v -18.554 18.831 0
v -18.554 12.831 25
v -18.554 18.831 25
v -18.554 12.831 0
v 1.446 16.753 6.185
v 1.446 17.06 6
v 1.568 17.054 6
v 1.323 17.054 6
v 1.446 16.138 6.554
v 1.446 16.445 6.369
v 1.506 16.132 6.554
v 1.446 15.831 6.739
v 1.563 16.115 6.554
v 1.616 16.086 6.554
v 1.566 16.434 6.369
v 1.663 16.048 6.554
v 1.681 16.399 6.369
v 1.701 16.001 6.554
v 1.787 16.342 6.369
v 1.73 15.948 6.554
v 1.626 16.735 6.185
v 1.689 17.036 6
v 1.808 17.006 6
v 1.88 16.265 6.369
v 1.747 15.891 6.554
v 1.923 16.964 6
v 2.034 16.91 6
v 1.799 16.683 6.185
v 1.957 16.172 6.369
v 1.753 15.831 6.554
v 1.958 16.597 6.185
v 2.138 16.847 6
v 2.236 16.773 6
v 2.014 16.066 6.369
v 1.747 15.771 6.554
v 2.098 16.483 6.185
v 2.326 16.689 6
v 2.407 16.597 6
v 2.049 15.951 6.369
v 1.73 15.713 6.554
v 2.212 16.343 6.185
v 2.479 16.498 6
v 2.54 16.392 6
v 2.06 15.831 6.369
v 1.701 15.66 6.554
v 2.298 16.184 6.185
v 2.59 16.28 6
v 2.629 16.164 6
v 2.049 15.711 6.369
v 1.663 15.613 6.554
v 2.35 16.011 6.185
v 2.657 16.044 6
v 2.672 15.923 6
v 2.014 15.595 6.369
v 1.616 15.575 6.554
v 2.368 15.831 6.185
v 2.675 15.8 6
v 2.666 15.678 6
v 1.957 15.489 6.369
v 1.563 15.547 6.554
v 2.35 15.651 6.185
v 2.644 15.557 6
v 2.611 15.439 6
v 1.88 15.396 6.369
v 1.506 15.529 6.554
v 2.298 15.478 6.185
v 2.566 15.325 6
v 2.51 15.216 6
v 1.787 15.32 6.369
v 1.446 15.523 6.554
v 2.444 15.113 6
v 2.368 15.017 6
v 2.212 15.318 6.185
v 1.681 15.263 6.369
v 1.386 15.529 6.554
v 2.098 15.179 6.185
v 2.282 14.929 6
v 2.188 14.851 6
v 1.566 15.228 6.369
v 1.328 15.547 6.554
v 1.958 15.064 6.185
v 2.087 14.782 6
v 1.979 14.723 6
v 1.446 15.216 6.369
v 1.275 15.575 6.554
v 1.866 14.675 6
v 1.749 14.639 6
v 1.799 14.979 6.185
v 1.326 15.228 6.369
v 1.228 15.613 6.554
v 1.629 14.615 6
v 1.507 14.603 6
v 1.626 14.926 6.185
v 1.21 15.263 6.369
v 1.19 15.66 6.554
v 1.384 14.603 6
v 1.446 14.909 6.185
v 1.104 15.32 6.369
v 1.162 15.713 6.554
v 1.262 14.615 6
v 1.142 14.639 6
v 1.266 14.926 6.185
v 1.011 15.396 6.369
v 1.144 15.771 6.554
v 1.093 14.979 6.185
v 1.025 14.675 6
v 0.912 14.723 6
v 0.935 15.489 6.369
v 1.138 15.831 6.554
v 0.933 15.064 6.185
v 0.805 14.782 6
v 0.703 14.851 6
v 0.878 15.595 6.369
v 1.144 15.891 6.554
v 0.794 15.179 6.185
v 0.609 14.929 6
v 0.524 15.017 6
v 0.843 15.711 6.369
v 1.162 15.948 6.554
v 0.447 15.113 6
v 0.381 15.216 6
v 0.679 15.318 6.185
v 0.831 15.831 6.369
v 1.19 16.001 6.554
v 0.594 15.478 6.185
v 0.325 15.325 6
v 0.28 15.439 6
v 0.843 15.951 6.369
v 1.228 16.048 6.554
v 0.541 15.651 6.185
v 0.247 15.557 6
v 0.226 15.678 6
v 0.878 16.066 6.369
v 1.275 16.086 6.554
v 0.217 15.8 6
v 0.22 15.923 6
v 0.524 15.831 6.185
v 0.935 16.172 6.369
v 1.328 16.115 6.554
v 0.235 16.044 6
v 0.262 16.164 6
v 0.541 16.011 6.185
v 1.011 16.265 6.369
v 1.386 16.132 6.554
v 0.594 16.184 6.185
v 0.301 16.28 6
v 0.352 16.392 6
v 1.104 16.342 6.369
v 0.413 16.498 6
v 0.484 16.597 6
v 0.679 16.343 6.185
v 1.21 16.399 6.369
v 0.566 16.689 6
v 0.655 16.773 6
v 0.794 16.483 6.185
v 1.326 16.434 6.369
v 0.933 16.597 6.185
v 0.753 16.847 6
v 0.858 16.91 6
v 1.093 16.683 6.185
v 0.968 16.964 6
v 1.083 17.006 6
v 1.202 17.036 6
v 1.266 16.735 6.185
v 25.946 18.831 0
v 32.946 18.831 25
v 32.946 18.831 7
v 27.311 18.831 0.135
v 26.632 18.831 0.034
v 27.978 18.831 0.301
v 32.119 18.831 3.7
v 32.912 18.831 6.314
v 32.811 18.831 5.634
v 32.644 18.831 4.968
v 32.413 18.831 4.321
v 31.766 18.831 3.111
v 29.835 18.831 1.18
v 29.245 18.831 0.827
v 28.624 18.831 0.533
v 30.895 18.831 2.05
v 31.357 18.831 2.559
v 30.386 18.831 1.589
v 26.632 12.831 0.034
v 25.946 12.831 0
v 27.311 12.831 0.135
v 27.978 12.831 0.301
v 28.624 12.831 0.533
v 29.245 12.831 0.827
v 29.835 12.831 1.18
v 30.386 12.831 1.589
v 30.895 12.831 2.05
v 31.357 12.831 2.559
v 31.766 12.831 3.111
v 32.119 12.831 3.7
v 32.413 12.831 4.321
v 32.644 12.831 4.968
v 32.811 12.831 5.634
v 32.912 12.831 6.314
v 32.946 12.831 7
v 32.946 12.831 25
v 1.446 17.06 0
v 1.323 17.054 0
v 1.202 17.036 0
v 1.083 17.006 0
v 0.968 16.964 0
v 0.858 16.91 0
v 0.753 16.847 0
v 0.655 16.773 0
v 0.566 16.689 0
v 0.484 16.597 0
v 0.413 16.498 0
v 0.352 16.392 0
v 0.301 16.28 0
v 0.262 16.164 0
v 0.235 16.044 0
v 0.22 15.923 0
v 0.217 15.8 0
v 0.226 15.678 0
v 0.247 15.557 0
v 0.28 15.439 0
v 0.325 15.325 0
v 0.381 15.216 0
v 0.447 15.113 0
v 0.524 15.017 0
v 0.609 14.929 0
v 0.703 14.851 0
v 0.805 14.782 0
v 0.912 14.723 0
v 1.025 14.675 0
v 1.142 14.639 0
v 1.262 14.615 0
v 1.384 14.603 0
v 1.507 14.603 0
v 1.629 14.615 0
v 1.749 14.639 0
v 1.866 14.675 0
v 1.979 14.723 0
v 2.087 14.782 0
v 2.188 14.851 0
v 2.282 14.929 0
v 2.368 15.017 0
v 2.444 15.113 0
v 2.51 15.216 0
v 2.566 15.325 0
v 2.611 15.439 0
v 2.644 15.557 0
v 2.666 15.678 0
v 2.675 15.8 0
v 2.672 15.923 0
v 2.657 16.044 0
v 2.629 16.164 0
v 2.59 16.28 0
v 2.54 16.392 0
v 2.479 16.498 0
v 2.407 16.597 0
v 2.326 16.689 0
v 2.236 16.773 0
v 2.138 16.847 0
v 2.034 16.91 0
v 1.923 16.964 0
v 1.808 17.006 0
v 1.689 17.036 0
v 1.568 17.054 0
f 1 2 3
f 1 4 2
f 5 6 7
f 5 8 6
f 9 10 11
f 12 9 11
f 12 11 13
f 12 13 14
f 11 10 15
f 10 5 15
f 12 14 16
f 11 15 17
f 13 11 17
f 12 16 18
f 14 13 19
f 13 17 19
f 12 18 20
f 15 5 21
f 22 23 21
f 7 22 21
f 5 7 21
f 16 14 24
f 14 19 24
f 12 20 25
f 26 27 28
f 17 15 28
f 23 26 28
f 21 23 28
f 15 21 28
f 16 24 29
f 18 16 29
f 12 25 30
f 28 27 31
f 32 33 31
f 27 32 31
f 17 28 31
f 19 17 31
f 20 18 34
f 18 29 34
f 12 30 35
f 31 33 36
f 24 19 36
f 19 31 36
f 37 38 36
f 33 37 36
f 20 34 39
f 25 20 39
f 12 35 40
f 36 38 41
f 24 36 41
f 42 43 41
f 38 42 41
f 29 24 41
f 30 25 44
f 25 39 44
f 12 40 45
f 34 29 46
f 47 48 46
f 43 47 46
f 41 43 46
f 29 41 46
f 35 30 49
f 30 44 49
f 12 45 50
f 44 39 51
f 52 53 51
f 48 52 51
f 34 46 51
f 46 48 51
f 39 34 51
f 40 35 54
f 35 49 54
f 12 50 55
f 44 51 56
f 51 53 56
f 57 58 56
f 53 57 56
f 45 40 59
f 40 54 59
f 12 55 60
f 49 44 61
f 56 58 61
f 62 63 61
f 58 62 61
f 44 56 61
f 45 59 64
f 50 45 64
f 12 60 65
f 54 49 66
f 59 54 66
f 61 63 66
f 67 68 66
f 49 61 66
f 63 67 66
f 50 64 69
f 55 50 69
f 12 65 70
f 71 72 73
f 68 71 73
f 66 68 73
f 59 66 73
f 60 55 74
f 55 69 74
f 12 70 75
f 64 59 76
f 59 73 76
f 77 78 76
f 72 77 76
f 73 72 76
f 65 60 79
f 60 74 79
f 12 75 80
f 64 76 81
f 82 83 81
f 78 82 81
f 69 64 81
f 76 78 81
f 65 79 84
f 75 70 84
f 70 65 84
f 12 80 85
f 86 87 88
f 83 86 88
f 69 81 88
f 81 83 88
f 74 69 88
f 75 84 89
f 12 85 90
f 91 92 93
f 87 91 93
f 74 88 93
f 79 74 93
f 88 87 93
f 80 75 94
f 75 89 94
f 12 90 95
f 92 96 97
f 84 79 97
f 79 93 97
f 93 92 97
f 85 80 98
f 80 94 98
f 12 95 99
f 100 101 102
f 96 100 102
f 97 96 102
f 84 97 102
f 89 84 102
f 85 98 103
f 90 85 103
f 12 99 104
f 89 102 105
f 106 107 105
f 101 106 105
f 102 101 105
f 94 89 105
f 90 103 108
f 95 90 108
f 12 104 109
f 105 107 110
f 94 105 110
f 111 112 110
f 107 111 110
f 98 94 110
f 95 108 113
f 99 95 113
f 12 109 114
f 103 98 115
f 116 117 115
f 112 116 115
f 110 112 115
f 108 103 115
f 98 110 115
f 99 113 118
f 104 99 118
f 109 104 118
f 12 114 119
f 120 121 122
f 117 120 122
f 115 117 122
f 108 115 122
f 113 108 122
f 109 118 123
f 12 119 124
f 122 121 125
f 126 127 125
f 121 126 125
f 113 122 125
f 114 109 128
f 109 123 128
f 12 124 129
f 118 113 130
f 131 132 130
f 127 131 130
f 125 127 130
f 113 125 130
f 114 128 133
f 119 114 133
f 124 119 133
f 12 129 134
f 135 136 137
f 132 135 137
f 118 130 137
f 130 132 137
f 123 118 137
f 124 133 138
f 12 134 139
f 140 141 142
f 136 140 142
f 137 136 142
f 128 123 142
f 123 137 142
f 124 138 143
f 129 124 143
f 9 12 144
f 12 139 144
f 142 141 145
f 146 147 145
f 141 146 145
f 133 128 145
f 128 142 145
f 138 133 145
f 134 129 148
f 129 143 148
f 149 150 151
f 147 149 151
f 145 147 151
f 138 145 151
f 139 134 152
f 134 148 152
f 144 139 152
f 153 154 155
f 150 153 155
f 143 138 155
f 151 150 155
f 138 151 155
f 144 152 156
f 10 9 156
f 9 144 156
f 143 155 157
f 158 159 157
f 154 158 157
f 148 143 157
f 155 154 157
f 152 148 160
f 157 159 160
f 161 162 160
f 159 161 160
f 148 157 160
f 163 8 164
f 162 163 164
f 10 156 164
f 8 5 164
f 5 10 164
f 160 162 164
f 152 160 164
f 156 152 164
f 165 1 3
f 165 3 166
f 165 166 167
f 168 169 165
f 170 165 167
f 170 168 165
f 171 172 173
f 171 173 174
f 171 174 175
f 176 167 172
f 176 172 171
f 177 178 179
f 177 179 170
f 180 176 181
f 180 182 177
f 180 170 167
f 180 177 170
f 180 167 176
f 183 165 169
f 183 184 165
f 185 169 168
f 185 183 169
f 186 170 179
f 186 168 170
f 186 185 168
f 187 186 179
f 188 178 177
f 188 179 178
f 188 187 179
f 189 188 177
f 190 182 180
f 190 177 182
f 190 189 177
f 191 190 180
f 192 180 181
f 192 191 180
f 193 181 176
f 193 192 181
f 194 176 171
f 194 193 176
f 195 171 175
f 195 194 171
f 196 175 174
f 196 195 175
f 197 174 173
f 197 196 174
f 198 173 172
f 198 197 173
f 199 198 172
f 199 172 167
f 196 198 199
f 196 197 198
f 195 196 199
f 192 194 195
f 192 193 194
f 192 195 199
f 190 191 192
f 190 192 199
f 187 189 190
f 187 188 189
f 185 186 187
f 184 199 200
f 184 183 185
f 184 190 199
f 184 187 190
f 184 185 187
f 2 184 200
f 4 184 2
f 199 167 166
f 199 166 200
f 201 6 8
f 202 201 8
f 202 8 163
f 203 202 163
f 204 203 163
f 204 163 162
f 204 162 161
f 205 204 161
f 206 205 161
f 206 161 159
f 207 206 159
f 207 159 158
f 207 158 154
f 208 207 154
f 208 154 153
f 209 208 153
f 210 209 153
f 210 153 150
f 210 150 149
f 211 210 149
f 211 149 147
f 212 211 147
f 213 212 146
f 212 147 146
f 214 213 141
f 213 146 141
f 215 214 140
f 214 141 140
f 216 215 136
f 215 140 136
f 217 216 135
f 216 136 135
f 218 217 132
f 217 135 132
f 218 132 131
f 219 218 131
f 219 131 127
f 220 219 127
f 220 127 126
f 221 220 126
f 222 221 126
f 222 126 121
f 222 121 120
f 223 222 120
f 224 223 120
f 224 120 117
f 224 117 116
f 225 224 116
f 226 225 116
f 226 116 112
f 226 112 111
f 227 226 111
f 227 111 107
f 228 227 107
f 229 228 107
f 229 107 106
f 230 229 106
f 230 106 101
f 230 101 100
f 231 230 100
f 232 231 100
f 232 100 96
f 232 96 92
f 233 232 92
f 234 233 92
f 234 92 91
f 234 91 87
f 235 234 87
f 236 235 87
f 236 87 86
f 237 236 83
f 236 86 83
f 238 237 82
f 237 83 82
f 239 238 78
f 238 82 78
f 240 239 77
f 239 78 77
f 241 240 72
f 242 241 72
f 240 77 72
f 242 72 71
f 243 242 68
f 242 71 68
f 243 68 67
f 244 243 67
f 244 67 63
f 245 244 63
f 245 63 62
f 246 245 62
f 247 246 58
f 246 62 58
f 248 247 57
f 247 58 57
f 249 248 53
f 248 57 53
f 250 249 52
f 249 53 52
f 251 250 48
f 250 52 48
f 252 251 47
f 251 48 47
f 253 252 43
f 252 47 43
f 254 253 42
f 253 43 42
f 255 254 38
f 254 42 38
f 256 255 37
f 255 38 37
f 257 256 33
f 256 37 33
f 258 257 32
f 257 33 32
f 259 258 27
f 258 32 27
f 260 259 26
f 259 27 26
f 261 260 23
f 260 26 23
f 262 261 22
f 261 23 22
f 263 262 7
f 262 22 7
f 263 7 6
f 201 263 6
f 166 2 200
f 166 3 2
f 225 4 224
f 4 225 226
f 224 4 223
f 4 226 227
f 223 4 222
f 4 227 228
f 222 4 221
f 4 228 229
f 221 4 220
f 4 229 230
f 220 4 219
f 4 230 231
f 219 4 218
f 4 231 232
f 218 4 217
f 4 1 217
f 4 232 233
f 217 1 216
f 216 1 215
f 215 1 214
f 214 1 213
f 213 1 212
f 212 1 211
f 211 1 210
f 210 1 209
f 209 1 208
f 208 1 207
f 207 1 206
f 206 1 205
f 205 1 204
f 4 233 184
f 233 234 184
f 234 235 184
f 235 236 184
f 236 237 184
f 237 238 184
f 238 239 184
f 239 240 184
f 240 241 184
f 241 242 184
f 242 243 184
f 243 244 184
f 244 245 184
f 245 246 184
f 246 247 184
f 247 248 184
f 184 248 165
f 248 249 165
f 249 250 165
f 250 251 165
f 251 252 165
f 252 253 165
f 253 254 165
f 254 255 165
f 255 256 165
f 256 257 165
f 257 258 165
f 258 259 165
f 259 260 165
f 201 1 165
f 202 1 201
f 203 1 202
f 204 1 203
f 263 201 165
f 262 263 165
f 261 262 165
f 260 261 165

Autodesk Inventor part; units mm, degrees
ref_plane "YZ Plane" through (0, 0, 0) normal (1, 0, 0) x (0, 1, 0)
ref_plane "XZ Plane" through (0, 0, 0) normal (0, 1, 0) x (-1, 0, 0)
ref_plane "XY Plane" through (0, 0, 0) normal (0, 0, 1) x (1, 0, 0)
sketch "Sketch1" plane through (0, 0, 0) normal (0, 0, 1) x (1, 0, 0)
  line L0 (-18.5543, 18.8307) -> (32.9457, 18.8307)
  line L1 (32.9457, 18.8307) -> (32.9457, 12.8307)
  line L2 (32.9457, 12.8307) -> (-18.5543, 12.8307)
  line L3 (-18.5543, 12.8307) -> (-18.5543, 18.8307)
  line L4 (-64.2543, 64.8307) -> (-64.2543, -33.1693) construction
  line L5 (32.9457, 15.8307) -> (-64.2543, 15.8307) construction
  line L6 (9.4457, -32.9193) -> (9.4457, 64.5807) construction
  point P0 (32.9457, 15.8307)
  dimension "d2" = 51.5
  dimension "d3" = 6
  dimension "d4" = 23.5
extrude "Extrusion1" add sketch "Sketch1" along normal blind 25
sketch "Sketch2" plane through (0, 0, 0) normal (0, 0, -1) x (-1, 0, 0)
  line L0 (18.5543, 18.8307) -> (18.5543, 12.8307) construction
  point P0 (0, 0)
  point P1 (-1.4457, 15.8307)
  point P2 (18.5543, 15.8307)
  dimension "d5" = 20
hole "Hole1" at (1.4457, 15.8307, 0) direction (0, 0, 1) diameter 2.459 depth 6 tip angle 118 thread size "M3x0.5" class "6H" standard "ISO Metric profile"
extrude "Extrusion2" [suppressed]
fillet "Fillet1" radius 7 1 edges at (32.9457, 15.8307, 0)
properties part number "Przegroda" material "Aluminum 6061"
